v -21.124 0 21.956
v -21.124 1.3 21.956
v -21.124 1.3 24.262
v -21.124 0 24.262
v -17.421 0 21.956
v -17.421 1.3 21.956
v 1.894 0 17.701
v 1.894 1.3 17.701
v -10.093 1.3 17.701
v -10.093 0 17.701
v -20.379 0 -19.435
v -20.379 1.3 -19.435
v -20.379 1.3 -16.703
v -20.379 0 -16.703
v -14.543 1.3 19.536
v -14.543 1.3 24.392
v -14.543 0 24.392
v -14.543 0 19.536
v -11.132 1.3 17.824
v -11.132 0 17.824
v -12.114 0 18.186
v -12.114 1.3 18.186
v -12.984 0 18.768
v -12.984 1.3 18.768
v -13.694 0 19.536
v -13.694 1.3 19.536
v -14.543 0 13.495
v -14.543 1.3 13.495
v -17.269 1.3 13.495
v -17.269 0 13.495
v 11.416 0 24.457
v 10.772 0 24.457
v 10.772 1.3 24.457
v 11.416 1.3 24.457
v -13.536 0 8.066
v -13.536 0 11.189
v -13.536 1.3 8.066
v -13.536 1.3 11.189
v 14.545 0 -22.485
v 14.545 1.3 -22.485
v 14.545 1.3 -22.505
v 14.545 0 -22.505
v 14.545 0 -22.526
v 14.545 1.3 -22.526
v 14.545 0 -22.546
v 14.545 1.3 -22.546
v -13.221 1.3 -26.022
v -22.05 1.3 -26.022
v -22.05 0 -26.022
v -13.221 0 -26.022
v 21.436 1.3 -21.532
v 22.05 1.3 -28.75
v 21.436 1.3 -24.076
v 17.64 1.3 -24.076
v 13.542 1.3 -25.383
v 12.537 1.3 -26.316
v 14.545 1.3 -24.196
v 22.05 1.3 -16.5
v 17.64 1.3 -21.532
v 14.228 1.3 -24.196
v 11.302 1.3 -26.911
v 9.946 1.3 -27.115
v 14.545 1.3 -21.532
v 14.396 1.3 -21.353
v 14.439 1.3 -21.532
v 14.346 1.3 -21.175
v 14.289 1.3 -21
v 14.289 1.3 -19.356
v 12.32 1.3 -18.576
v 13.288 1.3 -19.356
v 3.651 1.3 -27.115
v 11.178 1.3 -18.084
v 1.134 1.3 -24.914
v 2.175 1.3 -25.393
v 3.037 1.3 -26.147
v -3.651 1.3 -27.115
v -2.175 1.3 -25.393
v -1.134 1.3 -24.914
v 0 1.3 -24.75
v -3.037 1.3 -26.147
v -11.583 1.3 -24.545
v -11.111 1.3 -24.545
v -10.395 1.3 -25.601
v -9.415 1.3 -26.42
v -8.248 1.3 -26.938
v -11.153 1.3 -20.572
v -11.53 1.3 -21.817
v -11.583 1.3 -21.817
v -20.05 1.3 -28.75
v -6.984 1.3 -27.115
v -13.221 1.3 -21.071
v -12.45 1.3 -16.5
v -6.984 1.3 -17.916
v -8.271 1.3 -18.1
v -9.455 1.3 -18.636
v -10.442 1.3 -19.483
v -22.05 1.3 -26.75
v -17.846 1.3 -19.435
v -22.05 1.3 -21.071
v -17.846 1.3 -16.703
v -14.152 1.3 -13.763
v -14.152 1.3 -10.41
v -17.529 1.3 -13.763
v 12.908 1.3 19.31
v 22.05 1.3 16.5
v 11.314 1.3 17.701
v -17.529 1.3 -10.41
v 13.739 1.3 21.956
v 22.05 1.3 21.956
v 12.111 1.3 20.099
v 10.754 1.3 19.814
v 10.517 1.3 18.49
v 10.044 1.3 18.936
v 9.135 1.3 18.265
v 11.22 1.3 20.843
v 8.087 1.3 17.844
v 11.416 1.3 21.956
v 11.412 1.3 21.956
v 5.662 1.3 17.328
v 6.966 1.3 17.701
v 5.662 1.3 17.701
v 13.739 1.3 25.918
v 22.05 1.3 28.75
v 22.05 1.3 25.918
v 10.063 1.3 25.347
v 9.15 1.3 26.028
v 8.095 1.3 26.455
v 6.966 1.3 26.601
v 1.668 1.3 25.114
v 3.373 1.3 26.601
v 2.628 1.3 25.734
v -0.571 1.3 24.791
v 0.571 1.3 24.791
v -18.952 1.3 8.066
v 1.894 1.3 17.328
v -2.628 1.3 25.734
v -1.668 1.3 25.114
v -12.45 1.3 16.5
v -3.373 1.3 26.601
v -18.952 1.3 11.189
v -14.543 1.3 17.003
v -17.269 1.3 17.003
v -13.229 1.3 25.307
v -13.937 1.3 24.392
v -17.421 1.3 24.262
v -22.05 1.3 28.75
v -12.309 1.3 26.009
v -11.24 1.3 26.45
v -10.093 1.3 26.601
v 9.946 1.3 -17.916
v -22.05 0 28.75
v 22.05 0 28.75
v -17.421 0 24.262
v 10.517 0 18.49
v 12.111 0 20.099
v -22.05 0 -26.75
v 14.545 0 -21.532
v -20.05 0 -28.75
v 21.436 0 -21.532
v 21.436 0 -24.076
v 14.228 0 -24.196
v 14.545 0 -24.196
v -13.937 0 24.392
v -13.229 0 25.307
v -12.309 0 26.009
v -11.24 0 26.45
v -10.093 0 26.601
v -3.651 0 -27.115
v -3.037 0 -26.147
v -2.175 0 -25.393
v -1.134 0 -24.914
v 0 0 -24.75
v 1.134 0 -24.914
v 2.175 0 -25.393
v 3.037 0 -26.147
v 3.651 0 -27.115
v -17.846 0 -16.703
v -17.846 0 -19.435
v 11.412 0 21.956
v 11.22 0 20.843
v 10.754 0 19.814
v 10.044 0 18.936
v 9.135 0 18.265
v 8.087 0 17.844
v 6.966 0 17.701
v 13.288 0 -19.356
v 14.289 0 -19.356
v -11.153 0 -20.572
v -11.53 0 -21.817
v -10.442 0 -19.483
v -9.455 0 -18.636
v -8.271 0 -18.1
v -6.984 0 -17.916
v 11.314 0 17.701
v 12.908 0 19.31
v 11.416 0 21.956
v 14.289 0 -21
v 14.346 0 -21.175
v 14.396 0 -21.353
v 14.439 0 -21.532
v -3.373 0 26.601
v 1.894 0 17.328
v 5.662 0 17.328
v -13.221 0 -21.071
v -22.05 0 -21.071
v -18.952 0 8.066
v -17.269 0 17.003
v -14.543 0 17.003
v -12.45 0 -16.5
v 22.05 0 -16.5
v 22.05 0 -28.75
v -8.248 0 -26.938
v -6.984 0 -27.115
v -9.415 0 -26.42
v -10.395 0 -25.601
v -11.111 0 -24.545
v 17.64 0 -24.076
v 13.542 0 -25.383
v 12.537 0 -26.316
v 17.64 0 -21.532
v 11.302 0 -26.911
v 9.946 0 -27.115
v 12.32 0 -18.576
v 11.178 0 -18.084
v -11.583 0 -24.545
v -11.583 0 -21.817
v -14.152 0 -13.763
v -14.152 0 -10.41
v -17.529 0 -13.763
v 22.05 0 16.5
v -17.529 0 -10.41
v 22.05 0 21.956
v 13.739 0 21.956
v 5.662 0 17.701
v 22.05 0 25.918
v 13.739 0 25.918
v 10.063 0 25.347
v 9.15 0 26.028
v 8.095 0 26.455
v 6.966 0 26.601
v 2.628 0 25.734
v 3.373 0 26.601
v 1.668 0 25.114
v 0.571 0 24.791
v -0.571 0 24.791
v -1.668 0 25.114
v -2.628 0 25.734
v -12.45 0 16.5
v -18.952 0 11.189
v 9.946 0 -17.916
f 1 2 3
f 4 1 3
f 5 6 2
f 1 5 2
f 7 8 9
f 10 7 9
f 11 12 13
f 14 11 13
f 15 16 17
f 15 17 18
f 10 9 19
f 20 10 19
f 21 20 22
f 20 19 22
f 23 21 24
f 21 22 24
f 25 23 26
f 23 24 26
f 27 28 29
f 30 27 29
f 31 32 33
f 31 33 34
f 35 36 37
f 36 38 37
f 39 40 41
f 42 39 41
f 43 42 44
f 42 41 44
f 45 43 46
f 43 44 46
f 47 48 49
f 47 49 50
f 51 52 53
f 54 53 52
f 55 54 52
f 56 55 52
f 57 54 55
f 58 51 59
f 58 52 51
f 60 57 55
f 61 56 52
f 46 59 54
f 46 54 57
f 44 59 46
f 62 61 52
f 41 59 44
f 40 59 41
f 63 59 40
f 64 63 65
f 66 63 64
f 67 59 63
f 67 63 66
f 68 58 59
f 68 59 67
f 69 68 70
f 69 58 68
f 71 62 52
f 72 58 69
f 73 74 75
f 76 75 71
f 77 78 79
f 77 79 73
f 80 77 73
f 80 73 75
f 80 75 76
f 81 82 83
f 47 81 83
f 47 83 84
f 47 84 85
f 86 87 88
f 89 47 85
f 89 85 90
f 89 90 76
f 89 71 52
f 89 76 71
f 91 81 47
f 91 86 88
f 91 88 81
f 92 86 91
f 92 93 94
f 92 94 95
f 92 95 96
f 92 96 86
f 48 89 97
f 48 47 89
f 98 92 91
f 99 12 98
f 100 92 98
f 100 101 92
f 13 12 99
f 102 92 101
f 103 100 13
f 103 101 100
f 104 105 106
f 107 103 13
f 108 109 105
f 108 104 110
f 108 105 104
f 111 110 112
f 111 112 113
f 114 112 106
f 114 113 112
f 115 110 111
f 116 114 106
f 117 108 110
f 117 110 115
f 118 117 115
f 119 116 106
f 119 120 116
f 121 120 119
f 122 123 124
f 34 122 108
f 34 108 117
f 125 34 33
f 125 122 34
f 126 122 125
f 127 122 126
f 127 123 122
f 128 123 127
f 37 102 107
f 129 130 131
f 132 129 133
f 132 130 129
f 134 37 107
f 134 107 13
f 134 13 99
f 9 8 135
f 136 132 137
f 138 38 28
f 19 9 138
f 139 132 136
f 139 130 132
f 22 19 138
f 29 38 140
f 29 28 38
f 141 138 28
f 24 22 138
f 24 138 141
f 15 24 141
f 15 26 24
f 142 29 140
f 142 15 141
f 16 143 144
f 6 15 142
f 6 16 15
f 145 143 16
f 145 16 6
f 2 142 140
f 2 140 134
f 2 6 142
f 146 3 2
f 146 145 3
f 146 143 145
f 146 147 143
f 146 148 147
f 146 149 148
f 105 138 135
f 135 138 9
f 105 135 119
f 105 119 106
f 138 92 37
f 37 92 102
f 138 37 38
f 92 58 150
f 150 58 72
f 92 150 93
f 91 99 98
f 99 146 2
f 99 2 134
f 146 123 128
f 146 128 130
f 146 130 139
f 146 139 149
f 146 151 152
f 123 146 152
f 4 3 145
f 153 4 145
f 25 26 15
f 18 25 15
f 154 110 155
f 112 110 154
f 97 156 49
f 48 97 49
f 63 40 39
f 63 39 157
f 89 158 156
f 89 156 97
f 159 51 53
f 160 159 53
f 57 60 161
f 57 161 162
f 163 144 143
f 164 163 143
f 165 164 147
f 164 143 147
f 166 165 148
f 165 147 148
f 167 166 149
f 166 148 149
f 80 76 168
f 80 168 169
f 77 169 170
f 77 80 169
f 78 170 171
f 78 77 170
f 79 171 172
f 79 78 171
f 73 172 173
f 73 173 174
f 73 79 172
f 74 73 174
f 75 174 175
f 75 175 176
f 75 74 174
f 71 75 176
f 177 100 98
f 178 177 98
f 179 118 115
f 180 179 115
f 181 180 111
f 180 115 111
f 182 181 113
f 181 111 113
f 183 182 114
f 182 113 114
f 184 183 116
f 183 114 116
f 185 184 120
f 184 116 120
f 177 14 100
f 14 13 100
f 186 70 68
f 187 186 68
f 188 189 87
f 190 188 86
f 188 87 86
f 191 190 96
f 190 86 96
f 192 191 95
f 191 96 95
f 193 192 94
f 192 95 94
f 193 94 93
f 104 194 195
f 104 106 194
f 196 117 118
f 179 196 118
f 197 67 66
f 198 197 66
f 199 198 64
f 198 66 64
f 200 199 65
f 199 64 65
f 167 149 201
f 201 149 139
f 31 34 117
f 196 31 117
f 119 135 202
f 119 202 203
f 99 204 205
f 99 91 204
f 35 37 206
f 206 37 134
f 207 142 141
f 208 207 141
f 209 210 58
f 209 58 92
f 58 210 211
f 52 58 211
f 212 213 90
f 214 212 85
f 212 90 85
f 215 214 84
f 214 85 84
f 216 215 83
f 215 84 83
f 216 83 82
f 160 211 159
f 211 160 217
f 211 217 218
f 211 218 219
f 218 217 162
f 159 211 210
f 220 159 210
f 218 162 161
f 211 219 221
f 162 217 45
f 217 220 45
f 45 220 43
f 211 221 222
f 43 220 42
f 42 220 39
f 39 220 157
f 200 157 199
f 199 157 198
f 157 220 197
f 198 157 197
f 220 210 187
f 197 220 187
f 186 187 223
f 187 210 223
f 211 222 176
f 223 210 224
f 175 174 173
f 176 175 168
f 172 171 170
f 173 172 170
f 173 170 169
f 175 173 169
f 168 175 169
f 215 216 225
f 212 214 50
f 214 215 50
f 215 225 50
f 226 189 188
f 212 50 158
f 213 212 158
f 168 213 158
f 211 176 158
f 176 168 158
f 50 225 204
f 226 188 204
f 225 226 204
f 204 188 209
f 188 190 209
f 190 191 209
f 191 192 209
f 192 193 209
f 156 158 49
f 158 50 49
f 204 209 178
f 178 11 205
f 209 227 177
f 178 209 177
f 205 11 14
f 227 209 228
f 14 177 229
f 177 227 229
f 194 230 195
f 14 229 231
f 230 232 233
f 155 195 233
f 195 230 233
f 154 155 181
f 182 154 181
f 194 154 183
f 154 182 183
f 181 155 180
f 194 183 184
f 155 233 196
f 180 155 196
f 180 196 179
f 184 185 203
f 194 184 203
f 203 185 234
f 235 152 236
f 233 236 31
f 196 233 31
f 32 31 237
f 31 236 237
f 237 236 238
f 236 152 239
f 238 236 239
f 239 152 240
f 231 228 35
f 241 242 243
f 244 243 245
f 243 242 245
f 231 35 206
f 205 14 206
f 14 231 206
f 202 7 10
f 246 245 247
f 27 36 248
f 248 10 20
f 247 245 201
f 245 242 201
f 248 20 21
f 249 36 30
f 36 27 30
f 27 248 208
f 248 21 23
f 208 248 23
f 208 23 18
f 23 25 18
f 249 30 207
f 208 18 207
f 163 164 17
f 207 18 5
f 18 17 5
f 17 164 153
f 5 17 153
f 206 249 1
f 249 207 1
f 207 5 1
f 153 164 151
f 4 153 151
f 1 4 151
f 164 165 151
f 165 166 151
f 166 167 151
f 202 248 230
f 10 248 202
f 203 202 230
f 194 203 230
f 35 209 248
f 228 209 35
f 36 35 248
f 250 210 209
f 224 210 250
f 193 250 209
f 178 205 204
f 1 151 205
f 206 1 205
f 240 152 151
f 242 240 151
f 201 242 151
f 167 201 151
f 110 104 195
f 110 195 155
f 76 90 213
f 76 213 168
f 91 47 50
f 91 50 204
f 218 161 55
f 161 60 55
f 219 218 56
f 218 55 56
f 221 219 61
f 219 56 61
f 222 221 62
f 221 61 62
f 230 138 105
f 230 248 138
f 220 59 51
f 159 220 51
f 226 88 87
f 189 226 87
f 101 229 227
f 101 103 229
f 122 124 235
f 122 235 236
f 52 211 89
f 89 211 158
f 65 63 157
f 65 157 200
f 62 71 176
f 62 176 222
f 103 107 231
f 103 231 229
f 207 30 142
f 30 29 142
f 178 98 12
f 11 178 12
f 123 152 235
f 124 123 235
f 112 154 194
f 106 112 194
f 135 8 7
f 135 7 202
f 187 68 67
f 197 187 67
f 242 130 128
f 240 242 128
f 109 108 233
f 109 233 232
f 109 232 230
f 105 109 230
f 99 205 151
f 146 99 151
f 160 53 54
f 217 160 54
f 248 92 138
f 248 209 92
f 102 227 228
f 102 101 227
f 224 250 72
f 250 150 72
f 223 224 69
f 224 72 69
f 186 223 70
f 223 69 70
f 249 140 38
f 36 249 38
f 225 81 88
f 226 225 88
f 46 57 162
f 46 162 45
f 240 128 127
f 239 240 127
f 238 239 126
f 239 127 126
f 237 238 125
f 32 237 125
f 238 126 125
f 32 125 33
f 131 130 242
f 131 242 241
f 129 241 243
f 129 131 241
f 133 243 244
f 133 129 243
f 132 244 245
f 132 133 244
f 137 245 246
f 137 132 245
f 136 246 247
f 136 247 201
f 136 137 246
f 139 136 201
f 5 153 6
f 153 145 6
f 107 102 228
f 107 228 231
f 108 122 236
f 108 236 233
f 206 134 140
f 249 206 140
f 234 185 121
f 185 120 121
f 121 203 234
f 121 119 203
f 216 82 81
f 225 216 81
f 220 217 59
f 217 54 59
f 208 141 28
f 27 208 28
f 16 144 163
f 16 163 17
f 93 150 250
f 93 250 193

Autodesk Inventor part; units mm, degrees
ref_plane "YZ Plane" through (0, 0, 0) normal (1, 0, 0) x (0, 1, 0)
ref_plane "XZ Plane" through (0, 0, 0) normal (0, 1, 0) x (-1, 0, 0)
ref_plane "XY Plane" through (0, 0, 0) normal (0, 0, 1) x (1, 0, 0)
sketch "Sketch1" plane through (0, 0, 0) normal (0, 1, 0) x (-1, 0, 0)
  line L0 (-22.05, -28.75) -> (22.05, -28.75)
  line L1 (22.05, -28.75) -> (22.05, 28.75)
  line L2 (22.05, 28.75) -> (-22.05, 28.75)
  line L3 (-22.05, 28.75) -> (-22.05, -28.75)
  line L4 (-22.05, -28.75) -> (22.05, 28.75) construction
  line L5 (22.05, -28.75) -> (-22.05, 28.75) construction
  point P0 (0, 0)
  dimension "d0" = 57.5
  dimension "d1" = 44.1
extrude "Extrusion1" add sketch "Sketch1" along normal blind 1.3
chamfer "Chamfer1" distance 2 angle 45 1 edges at (-22.05, 0.65, -28.75)
sketch "Sketch4" plane through (0, 1.3, 0) normal (0, 1, 0) x (1, 0, 0)
  line L0 (22.6381, -25.9185) -> (13.7388, -25.9185)
  line L1 (13.7388, -25.9185) -> (13.7388, -21.956)
  line L2 (13.7388, -21.956) -> (22.6381, -21.956)
  line L3 (22.6381, -21.956) -> (22.6381, -25.9185)
  line L4 (11.4165, -21.956) -> (0.7633, -21.956)
  line L5 (0.7633, -21.956) -> (0.7633, -24.4569)
  line L6 (0.7633, -24.4569) -> (11.4165, -24.4569)
  line L7 (11.4165, -24.4569) -> (11.4165, -21.956)
  line L8 (-0.6658, -26.6006) -> (-6.707, -26.6006)
  line L9 (-6.707, -26.6006) -> (-6.707, -22.3783)
  line L10 (-6.707, -22.3783) -> (-0.6658, -22.3783)
  line L11 (-0.6658, -22.3783) -> (-0.6658, -26.6006)
  line L12 (-6.707, -24.392) -> (-14.5426, -24.392)
  line L13 (-14.5426, -24.392) -> (-14.5426, -21.0953)
  line L14 (-14.5426, -21.0953) -> (-6.707, -21.0953)
  line L15 (-6.707, -21.0953) -> (-6.707, -24.392)
  line L16 (-14.5426, -21.0953) -> (-11.8996, -21.0953)
  line L17 (-11.8996, -21.0953) -> (-11.8996, -19.5363)
  line L18 (-11.8996, -19.5363) -> (-14.5426, -19.5363)
  line L19 (-14.5426, -19.5363) -> (-14.5426, -21.0953)
  line L20 (-21.1238, -24.2621) -> (-17.4211, -24.2621)
  line L21 (-17.4211, -24.2621) -> (-17.4211, -21.956)
  line L22 (-17.4211, -21.956) -> (-21.1238, -21.956)
  line L23 (-21.1238, -21.956) -> (-21.1238, -24.2621)
  line L24 (5.6616, -20.7705) -> (1.894, -20.7705)
  line L25 (1.894, -20.7705) -> (1.894, -17.3277)
  line L26 (1.894, -17.3277) -> (5.6616, -17.3277)
  line L27 (5.6616, -17.3277) -> (5.6616, -20.7705)
  line L28 (-2.848, -19.9261) -> (-5.2515, -19.9261)
  line L29 (-5.2515, -19.9261) -> (-5.2515, -18.3346)
  line L30 (-5.2515, -18.3346) -> (-2.848, -18.3346)
  line L31 (-2.848, -18.3346) -> (-2.848, -19.9261)
  line L32 (-17.2689, -17.0029) -> (-14.5426, -17.0029)
  line L33 (-14.5426, -17.0029) -> (-14.5426, -13.4952)
  line L34 (-14.5426, -13.4952) -> (-17.2689, -13.4952)
  line L35 (-17.2689, -13.4952) -> (-17.2689, -17.0029)
  line L36 (15.925, -11.4814) -> (12.4173, -11.4814)
  line L37 (12.4173, -11.4814) -> (12.4173, -14.7294)
  line L38 (12.4173, -14.7294) -> (15.925, -14.7294)
  line L39 (15.925, -14.7294) -> (15.925, -11.4814)
  line L40 (-2.1335, 9.0455) -> (1.894, 9.0455)
  line L41 (1.894, 9.0455) -> (1.894, -8.9481)
  line L42 (1.894, -8.9481) -> (-2.1335, -8.9481)
  line L43 (-2.1335, -8.9481) -> (-2.1335, 9.0455)
  line L44 (4.5573, 3.3291) -> (1.6991, 3.3291)
  line L45 (1.6991, 3.3291) -> (1.6991, 0.6009)
  line L46 (1.6991, 0.6009) -> (4.5573, 0.6009)
  line L47 (4.5573, 0.6009) -> (4.5573, 3.3291)
  line L48 (-17.5287, 13.7631) -> (-14.1519, 13.7631)
  line L49 (-14.1519, 13.7631) -> (-14.1519, 10.4096)
  line L50 (-14.1519, 10.4096) -> (-17.5287, 10.4096)
  line L51 (-17.5287, 10.4096) -> (-17.5287, 13.7631)
  line L52 (16.8052, 16.3739) -> (14.7212, 16.3739)
  line L53 (14.7212, 16.3739) -> (14.7212, 12.4259)
  line L54 (14.7212, 12.4259) -> (16.8052, 12.4259)
  line L55 (16.8052, 12.4259) -> (16.8052, 16.3739)
  line L56 (-23.3919, 26.0219) -> (-13.2211, 26.0219)
  line L57 (-13.2211, 26.0219) -> (-13.2211, 21.0711)
  line L58 (-13.2211, 21.0711) -> (-23.3919, 21.0711)
  line L59 (-23.3919, 21.0711) -> (-23.3919, 26.0219)
  line L60 (-20.3793, 16.7032) -> (-17.8455, 16.7032)
  line L61 (-17.8455, 16.7032) -> (-17.8455, 19.4346)
  line L62 (-17.8455, 19.4346) -> (-20.3793, 19.4346)
  line L63 (-20.3793, 19.4346) -> (-20.3793, 16.7032)
  line L64 (-11.5832, 21.8169) -> (-0.7032, 21.8169)
  line L65 (-0.7032, 21.8169) -> (-0.7032, 24.5446)
  line L66 (-0.7032, 24.5446) -> (-11.5832, 24.5446)
  line L67 (-11.5832, 24.5446) -> (-11.5832, 21.8169)
  line L68 (-2.5673, 18.6812) -> (-4.8458, 18.6812)
  line L69 (-4.8458, 18.6812) -> (-4.8458, 22.2038)
  line L70 (-4.8458, 22.2038) -> (-2.5673, 22.2038)
  line L71 (-2.5673, 22.2038) -> (-2.5673, 18.6812)
  line L72 (0.9146, 27.1153) -> (6.539, 27.1153)
  line L73 (6.539, 27.1153) -> (6.539, 22.2038)
  line L74 (6.539, 22.2038) -> (0.9146, 22.2038)
  line L75 (0.9146, 22.2038) -> (0.9146, 27.1153)
  line L76 (2.2307, 17.9158) -> (4.5573, 17.9158)
  line L77 (4.5573, 17.9158) -> (4.5573, 22.2038)
  line L78 (4.5573, 22.2038) -> (2.2307, 22.2038)
  line L79 (2.2307, 22.2038) -> (2.2307, 17.9158)
  line L80 (6.0899, 24.1958) -> (14.5454, 24.1958)
  line L81 (14.5454, 24.1958) -> (14.5454, 21.5323)
  line L82 (14.5454, 21.5323) -> (6.0899, 21.5323)
  line L83 (6.0899, 21.5323) -> (6.0899, 24.1958)
  line L84 (14.2886, 21.5323) -> (11.9019, 21.5323)
  line L85 (11.9019, 21.5323) -> (11.9019, 19.3557)
  line L86 (11.9019, 19.3557) -> (14.2886, 19.3557)
  line L87 (14.2886, 19.3557) -> (14.2886, 21.5323)
  line L88 (21.4363, 24.0758) -> (17.64, 24.0758)
  line L89 (17.64, 24.0758) -> (17.64, 21.5323)
  line L90 (17.64, 21.5323) -> (21.4363, 21.5323)
  line L91 (21.4363, 21.5323) -> (21.4363, 24.0758)
  line L92 (12.1107, -20.099) -> (10.5174, -18.49)
  line L93 (10.5174, -18.49) -> (11.3144, -17.7008)
  line L94 (11.3144, -17.7008) -> (12.9077, -19.3099)
  line L95 (12.9077, -19.3099) -> (12.1107, -20.099)
  line L96 (-18.9518, -11.1888) -> (-13.5356, -11.1888)
  line L97 (-13.5356, -11.1888) -> (-13.5356, -8.0664)
  line L98 (-13.5356, -8.0664) -> (-18.9518, -8.0664)
  line L99 (-18.9518, -8.0664) -> (-18.9518, -11.1888)
  point P0 (0, 0)
  point P1 (6.539, 24.1958)
  point P2 (6.0899, 22.2038)
extrude "Clearance Cutouts" cut sketch "Sketch4" against normal blind 1.5
sketch "Sketch5" plane through (0, 1.3, 0) normal (0, 1, 0) x (1, 0, 0)
  line L0 (9.9457, 22.5156) -> (-6.9835, 22.5156) construction
  line L1 (9.9457, 17.9158) -> (-6.9835, 17.9158)
  line L2 (-6.9835, 27.1153) -> (9.9457, 27.1153)
  arc A0 (9.9457, 17.9158) -> (9.9457, 27.1153) centre (9.9457, 22.5156) ccw
  arc A1 (-6.9835, 27.1153) -> (-6.9835, 17.9158) centre (-6.9835, 22.5156) ccw
  line L3 (-11.5832, 24.5446) -> (-0.7032, 24.5446) projected
  line L4 (0.9146, 22.2038) -> (0.9146, 27.1153) projected
  line L5 (-13.2211, 26.0219) -> (-13.2211, 21.0711) projected
  line L6 (-11.5832, 21.8169) -> (-11.5832, 24.5446) projected
  line L7 (14.5454, 24.1958) -> (14.5454, 21.5323) projected
  line L8 (-10.0926, -22.1506) -> (6.9665, -22.1506) construction
  line L9 (-10.0926, -26.6006) -> (6.9665, -26.6006)
  line L10 (6.9665, -17.7006) -> (-10.0926, -17.7006)
  arc A2 (-10.0926, -17.7006) -> (-10.0926, -26.6006) centre (-10.0926, -22.1506) ccw
  arc A3 (6.9665, -26.6006) -> (6.9665, -17.7006) centre (6.9665, -22.1506) ccw
  point P0 (0, 0)
  point P1 (1.4811, 22.5156)
  point P2 (14.5454, 22.5156)
  point P3 (-11.5832, 22.5156)
  point P4 (4.5573, 17.9158)
  point P5 (-1.5631, -22.1506)
  point P6 (-0.6658, -26.6006)
  point P7 (11.4165, -22.1506)
  point P8 (11.4165, -24.4569)
  point P9 (-14.5426, -22.1506)
  point P10 (-14.5426, -19.5363)
  dimension "d53" = 8.9
extrude "Extrusion4" cut sketch "Sketch5" against normal blind 1.5 contours L1 A1 L2 A0 | A2 L10 A3 L9
sketch "Sketch6" plane through (0, 0, 0) normal (0, -1, 0) x (1, 0, 0)
  line L0 (22.05, 21.956) -> (22.05, -28.75) projected
  line L1 (22.05, -16.5) -> (-12.45, -16.5)
  line L2 (-12.45, -16.5) -> (-12.45, 16.5)
  line L3 (-12.45, 16.5) -> (22.05, 16.5)
  line L4 (22.05, 16.5) -> (22.05, -16.5)
  point P0 (0, 0)
  point P1 (22.05, 16.5)
  dimension "d44" = 33
  dimension "d45" = 34.5
  dimension "d46" = 16.5
extrude "Extrusion5" cut sketch "Sketch6" against normal through all
sketch "Sketch7" plane through (0, 1.3, 0) normal (0, 1, 0) x (1, 0, 0)
  line L0 (-22.05, -28.75) -> (22.05, -28.75) projected
  arc A0 (4, -28.75) -> (-4, -28.75) centre (0, -28.75) ccw
  line L1 (22.05, 28.75) -> (-20.05, 28.75) projected
  arc A1 (-4, 28.75) -> (4, 28.75) centre (0, 28.75) ccw
  line L2 (22.05, 28.75) -> (-20.05, 28.75) projected
  point P0 (0, 0)
  point P1 (4, 28.75)
  dimension "d49" = 4
  dimension "d50" = 4
extrude "Extrusion6" add sketch "Sketch7" against normal up to surface (1.3 mm away)
equation "\"d46\" = 0.5 * d44"
equation "\"d50\" = d49"
properties part number "Flex Holder V1" material "Thermoplastic Resin"
